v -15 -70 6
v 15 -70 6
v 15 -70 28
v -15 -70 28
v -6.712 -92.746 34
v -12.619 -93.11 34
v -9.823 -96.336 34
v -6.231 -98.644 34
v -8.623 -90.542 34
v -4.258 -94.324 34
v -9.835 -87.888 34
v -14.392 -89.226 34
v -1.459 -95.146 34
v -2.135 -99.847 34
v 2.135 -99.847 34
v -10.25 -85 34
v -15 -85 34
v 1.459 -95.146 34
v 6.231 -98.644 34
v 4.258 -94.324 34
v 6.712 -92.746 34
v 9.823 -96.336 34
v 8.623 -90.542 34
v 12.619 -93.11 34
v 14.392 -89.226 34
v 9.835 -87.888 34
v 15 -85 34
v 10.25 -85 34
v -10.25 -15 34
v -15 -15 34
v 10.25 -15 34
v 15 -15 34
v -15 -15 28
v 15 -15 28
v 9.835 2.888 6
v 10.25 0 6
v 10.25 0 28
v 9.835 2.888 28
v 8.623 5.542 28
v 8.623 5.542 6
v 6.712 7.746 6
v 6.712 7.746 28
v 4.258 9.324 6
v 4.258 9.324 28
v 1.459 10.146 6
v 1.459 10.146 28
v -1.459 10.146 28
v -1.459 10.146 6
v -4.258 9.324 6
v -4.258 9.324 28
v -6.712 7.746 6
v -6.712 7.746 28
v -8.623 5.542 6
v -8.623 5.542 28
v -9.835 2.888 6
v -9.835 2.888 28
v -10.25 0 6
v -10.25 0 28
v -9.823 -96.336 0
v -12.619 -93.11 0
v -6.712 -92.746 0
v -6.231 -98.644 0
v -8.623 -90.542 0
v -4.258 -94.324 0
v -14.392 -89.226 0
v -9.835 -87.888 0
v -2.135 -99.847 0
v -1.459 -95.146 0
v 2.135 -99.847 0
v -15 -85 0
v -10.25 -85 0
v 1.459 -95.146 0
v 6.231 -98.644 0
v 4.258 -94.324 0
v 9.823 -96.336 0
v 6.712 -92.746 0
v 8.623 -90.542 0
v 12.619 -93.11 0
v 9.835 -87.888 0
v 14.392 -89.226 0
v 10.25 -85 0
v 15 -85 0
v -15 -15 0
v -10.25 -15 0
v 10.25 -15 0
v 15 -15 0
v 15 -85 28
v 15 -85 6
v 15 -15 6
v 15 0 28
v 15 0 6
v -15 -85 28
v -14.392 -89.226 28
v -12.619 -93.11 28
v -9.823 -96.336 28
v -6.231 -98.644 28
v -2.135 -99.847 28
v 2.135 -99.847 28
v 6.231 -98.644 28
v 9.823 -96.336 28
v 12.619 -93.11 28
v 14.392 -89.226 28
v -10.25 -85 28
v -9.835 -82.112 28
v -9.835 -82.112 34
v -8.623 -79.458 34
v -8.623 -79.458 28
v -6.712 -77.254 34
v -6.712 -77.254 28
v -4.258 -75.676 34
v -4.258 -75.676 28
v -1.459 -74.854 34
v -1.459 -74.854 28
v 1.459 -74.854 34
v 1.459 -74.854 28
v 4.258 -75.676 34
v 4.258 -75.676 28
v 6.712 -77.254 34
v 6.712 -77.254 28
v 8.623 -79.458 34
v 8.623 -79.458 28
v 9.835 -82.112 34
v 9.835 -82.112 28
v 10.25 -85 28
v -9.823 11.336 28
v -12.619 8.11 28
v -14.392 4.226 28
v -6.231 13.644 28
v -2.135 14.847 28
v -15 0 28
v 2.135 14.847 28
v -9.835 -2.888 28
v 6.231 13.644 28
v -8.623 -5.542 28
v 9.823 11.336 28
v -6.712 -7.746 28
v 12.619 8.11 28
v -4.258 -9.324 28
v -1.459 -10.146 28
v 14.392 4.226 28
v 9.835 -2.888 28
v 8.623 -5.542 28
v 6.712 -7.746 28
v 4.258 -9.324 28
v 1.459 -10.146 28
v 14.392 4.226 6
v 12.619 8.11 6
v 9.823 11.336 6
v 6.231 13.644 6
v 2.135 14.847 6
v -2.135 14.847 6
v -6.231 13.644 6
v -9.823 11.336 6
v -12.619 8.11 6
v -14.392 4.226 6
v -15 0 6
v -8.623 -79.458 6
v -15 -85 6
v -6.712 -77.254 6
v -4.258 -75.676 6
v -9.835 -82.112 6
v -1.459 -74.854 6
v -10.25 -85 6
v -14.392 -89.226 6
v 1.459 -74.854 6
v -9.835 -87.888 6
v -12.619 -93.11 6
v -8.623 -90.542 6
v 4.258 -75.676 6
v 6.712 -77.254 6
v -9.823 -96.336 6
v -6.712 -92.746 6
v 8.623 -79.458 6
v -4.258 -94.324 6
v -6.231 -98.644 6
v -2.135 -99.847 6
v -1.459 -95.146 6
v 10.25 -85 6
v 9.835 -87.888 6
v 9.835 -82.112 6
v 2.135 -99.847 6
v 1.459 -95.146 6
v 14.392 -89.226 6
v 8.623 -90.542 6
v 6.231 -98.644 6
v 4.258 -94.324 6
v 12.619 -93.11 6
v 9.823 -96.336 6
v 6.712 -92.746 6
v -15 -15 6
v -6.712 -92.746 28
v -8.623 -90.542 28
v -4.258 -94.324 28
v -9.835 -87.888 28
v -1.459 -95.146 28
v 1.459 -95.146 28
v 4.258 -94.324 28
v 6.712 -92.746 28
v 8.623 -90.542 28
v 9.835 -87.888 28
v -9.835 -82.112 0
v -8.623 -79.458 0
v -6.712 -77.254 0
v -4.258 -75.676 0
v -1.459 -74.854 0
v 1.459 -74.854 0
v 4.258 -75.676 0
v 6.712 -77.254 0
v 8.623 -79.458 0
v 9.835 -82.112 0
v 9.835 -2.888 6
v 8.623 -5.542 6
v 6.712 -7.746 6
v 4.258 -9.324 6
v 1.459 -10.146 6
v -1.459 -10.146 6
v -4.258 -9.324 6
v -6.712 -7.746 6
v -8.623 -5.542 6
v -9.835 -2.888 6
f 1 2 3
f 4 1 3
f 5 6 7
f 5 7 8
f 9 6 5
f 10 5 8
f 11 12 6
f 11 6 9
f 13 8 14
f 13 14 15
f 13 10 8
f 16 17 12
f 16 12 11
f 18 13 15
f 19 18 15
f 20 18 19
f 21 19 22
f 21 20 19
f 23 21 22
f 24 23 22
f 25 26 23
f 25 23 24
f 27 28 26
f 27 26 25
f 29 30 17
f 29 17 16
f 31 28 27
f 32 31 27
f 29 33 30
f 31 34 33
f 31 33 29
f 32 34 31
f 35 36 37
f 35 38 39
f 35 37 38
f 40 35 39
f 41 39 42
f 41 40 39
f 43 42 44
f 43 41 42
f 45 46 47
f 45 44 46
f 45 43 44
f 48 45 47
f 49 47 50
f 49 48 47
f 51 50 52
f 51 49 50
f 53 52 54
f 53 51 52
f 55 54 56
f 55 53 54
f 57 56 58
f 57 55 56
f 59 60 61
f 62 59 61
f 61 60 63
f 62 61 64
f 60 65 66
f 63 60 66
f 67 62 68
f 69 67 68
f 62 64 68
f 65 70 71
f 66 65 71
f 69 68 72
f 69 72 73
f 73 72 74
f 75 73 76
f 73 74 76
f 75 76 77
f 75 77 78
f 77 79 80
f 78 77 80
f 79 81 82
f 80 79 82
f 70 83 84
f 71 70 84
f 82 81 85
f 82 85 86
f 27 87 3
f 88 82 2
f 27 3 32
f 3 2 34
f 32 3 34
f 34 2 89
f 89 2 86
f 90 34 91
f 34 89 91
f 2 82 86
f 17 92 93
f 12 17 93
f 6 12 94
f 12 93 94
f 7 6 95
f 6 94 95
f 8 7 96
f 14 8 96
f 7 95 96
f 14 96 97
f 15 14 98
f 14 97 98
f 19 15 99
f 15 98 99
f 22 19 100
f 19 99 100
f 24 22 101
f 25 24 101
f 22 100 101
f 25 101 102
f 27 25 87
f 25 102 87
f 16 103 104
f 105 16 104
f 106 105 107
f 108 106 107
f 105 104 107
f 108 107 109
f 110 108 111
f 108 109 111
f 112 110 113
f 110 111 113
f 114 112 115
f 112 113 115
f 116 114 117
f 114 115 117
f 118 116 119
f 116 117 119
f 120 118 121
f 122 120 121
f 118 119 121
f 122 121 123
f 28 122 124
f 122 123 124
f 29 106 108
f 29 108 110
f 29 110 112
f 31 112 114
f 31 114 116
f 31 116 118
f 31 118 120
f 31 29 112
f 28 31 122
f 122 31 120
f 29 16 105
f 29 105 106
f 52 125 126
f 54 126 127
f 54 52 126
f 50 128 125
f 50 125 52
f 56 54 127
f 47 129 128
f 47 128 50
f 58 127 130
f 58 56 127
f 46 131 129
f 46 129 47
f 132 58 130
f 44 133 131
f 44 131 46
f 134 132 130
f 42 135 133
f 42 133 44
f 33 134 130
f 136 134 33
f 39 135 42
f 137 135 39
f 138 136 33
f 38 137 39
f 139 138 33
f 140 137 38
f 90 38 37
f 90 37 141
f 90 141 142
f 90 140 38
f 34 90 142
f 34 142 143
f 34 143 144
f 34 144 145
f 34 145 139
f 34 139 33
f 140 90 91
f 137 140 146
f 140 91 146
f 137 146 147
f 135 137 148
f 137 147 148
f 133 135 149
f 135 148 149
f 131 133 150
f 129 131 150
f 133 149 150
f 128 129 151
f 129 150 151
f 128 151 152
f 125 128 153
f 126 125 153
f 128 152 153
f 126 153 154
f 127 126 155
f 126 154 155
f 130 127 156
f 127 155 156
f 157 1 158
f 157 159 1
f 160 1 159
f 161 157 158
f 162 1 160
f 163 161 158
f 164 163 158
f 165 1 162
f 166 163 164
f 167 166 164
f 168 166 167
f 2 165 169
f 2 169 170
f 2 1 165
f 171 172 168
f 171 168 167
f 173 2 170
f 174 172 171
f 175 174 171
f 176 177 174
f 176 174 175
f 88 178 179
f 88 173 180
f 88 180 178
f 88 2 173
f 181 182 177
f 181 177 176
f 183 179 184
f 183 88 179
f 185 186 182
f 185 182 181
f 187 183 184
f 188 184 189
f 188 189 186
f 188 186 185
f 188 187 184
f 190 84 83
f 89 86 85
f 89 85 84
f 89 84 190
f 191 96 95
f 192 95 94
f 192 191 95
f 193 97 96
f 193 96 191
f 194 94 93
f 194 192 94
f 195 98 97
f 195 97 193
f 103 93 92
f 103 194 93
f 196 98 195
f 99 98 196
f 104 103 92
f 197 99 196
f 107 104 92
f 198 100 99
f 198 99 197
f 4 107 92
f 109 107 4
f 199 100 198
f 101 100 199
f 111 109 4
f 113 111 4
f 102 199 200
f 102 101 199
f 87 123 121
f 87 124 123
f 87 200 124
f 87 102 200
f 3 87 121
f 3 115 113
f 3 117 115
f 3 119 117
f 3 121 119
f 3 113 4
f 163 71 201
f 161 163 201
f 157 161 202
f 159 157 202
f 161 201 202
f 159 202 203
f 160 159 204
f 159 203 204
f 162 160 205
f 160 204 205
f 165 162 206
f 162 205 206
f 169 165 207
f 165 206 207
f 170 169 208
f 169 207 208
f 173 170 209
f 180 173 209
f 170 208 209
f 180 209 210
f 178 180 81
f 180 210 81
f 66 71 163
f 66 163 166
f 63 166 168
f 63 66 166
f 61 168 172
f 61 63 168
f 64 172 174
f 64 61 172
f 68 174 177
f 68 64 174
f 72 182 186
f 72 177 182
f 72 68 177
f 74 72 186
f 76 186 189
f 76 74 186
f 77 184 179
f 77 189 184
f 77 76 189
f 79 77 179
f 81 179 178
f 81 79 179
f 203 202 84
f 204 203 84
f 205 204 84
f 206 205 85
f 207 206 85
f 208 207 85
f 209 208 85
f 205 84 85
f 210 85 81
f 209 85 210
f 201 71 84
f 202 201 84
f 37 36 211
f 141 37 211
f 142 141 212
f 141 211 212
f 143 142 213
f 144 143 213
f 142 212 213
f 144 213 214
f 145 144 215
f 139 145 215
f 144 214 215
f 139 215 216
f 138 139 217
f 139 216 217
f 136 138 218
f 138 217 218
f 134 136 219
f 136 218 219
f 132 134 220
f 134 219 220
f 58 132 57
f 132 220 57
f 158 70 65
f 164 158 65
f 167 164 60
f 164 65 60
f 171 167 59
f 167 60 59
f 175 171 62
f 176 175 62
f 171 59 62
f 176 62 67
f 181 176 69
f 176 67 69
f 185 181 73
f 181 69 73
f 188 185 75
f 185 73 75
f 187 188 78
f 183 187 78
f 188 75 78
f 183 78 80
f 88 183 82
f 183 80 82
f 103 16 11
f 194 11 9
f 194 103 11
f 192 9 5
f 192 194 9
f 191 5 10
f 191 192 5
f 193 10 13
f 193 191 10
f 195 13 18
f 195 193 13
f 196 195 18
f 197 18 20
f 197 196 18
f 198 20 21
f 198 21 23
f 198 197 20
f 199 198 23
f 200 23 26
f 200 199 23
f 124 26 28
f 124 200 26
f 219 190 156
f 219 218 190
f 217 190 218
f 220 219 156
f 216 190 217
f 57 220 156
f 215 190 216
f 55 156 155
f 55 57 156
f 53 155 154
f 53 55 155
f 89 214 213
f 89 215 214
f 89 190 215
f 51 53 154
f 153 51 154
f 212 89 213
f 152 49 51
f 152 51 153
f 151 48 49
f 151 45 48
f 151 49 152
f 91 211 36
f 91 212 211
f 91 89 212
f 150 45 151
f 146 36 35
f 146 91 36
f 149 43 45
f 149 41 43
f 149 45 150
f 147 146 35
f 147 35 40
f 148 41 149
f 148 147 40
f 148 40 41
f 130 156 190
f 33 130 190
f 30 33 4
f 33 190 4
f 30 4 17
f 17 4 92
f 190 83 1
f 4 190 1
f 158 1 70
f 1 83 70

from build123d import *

# Parameters (mm, degrees)
SKETCH1_R               = 10.25
BOSS_EXTRUDE2_DEPTH     = 34
CUT_EXTRUDE3_DEPTH      = 110.79981785
CUT_EXTRUDE3_DEPTH_BACK = 110.79981785
SKETCH3_W               = 6
SKETCH3_H               = 30
SKETCH3_W_2             = 22


with BuildPart() as part:
    # Sketch1 → Boss-Extrude2 (new body)
    with BuildSketch(Plane.XY):
        with BuildLine():
            Line((15, -85), (15, 0))
            ThreePointArc((15, 0), (0, 15), (-15, 0))
            Line((-15, 0), (-15, -85))
            ThreePointArc((-15, -85), (0, -100), (15, -85))
        make_face()
        with Locations((0, -85)):
            Circle(SKETCH1_R, mode=Mode.SUBTRACT)
        Circle(SKETCH1_R, mode=Mode.SUBTRACT)
    extrude(amount=BOSS_EXTRUDE2_DEPTH)

    # Sketch3 → Cut-Extrude3 (cut, two sides: drawn at the far end of the back side and taken through both)
    with BuildSketch(Plane.ZY.offset(15).offset(-CUT_EXTRUDE3_DEPTH_BACK)):
        with Locations((3, 0)):
            Rectangle(SKETCH3_W, SKETCH3_H)
        with Locations((31, 0)):
            Rectangle(SKETCH3_W, SKETCH3_H)
        with Locations((17, -85)):
            Rectangle(SKETCH3_W_2, SKETCH3_H)
    extrude(amount=CUT_EXTRUDE3_DEPTH + CUT_EXTRUDE3_DEPTH_BACK, mode=Mode.SUBTRACT)


solid = part.part
